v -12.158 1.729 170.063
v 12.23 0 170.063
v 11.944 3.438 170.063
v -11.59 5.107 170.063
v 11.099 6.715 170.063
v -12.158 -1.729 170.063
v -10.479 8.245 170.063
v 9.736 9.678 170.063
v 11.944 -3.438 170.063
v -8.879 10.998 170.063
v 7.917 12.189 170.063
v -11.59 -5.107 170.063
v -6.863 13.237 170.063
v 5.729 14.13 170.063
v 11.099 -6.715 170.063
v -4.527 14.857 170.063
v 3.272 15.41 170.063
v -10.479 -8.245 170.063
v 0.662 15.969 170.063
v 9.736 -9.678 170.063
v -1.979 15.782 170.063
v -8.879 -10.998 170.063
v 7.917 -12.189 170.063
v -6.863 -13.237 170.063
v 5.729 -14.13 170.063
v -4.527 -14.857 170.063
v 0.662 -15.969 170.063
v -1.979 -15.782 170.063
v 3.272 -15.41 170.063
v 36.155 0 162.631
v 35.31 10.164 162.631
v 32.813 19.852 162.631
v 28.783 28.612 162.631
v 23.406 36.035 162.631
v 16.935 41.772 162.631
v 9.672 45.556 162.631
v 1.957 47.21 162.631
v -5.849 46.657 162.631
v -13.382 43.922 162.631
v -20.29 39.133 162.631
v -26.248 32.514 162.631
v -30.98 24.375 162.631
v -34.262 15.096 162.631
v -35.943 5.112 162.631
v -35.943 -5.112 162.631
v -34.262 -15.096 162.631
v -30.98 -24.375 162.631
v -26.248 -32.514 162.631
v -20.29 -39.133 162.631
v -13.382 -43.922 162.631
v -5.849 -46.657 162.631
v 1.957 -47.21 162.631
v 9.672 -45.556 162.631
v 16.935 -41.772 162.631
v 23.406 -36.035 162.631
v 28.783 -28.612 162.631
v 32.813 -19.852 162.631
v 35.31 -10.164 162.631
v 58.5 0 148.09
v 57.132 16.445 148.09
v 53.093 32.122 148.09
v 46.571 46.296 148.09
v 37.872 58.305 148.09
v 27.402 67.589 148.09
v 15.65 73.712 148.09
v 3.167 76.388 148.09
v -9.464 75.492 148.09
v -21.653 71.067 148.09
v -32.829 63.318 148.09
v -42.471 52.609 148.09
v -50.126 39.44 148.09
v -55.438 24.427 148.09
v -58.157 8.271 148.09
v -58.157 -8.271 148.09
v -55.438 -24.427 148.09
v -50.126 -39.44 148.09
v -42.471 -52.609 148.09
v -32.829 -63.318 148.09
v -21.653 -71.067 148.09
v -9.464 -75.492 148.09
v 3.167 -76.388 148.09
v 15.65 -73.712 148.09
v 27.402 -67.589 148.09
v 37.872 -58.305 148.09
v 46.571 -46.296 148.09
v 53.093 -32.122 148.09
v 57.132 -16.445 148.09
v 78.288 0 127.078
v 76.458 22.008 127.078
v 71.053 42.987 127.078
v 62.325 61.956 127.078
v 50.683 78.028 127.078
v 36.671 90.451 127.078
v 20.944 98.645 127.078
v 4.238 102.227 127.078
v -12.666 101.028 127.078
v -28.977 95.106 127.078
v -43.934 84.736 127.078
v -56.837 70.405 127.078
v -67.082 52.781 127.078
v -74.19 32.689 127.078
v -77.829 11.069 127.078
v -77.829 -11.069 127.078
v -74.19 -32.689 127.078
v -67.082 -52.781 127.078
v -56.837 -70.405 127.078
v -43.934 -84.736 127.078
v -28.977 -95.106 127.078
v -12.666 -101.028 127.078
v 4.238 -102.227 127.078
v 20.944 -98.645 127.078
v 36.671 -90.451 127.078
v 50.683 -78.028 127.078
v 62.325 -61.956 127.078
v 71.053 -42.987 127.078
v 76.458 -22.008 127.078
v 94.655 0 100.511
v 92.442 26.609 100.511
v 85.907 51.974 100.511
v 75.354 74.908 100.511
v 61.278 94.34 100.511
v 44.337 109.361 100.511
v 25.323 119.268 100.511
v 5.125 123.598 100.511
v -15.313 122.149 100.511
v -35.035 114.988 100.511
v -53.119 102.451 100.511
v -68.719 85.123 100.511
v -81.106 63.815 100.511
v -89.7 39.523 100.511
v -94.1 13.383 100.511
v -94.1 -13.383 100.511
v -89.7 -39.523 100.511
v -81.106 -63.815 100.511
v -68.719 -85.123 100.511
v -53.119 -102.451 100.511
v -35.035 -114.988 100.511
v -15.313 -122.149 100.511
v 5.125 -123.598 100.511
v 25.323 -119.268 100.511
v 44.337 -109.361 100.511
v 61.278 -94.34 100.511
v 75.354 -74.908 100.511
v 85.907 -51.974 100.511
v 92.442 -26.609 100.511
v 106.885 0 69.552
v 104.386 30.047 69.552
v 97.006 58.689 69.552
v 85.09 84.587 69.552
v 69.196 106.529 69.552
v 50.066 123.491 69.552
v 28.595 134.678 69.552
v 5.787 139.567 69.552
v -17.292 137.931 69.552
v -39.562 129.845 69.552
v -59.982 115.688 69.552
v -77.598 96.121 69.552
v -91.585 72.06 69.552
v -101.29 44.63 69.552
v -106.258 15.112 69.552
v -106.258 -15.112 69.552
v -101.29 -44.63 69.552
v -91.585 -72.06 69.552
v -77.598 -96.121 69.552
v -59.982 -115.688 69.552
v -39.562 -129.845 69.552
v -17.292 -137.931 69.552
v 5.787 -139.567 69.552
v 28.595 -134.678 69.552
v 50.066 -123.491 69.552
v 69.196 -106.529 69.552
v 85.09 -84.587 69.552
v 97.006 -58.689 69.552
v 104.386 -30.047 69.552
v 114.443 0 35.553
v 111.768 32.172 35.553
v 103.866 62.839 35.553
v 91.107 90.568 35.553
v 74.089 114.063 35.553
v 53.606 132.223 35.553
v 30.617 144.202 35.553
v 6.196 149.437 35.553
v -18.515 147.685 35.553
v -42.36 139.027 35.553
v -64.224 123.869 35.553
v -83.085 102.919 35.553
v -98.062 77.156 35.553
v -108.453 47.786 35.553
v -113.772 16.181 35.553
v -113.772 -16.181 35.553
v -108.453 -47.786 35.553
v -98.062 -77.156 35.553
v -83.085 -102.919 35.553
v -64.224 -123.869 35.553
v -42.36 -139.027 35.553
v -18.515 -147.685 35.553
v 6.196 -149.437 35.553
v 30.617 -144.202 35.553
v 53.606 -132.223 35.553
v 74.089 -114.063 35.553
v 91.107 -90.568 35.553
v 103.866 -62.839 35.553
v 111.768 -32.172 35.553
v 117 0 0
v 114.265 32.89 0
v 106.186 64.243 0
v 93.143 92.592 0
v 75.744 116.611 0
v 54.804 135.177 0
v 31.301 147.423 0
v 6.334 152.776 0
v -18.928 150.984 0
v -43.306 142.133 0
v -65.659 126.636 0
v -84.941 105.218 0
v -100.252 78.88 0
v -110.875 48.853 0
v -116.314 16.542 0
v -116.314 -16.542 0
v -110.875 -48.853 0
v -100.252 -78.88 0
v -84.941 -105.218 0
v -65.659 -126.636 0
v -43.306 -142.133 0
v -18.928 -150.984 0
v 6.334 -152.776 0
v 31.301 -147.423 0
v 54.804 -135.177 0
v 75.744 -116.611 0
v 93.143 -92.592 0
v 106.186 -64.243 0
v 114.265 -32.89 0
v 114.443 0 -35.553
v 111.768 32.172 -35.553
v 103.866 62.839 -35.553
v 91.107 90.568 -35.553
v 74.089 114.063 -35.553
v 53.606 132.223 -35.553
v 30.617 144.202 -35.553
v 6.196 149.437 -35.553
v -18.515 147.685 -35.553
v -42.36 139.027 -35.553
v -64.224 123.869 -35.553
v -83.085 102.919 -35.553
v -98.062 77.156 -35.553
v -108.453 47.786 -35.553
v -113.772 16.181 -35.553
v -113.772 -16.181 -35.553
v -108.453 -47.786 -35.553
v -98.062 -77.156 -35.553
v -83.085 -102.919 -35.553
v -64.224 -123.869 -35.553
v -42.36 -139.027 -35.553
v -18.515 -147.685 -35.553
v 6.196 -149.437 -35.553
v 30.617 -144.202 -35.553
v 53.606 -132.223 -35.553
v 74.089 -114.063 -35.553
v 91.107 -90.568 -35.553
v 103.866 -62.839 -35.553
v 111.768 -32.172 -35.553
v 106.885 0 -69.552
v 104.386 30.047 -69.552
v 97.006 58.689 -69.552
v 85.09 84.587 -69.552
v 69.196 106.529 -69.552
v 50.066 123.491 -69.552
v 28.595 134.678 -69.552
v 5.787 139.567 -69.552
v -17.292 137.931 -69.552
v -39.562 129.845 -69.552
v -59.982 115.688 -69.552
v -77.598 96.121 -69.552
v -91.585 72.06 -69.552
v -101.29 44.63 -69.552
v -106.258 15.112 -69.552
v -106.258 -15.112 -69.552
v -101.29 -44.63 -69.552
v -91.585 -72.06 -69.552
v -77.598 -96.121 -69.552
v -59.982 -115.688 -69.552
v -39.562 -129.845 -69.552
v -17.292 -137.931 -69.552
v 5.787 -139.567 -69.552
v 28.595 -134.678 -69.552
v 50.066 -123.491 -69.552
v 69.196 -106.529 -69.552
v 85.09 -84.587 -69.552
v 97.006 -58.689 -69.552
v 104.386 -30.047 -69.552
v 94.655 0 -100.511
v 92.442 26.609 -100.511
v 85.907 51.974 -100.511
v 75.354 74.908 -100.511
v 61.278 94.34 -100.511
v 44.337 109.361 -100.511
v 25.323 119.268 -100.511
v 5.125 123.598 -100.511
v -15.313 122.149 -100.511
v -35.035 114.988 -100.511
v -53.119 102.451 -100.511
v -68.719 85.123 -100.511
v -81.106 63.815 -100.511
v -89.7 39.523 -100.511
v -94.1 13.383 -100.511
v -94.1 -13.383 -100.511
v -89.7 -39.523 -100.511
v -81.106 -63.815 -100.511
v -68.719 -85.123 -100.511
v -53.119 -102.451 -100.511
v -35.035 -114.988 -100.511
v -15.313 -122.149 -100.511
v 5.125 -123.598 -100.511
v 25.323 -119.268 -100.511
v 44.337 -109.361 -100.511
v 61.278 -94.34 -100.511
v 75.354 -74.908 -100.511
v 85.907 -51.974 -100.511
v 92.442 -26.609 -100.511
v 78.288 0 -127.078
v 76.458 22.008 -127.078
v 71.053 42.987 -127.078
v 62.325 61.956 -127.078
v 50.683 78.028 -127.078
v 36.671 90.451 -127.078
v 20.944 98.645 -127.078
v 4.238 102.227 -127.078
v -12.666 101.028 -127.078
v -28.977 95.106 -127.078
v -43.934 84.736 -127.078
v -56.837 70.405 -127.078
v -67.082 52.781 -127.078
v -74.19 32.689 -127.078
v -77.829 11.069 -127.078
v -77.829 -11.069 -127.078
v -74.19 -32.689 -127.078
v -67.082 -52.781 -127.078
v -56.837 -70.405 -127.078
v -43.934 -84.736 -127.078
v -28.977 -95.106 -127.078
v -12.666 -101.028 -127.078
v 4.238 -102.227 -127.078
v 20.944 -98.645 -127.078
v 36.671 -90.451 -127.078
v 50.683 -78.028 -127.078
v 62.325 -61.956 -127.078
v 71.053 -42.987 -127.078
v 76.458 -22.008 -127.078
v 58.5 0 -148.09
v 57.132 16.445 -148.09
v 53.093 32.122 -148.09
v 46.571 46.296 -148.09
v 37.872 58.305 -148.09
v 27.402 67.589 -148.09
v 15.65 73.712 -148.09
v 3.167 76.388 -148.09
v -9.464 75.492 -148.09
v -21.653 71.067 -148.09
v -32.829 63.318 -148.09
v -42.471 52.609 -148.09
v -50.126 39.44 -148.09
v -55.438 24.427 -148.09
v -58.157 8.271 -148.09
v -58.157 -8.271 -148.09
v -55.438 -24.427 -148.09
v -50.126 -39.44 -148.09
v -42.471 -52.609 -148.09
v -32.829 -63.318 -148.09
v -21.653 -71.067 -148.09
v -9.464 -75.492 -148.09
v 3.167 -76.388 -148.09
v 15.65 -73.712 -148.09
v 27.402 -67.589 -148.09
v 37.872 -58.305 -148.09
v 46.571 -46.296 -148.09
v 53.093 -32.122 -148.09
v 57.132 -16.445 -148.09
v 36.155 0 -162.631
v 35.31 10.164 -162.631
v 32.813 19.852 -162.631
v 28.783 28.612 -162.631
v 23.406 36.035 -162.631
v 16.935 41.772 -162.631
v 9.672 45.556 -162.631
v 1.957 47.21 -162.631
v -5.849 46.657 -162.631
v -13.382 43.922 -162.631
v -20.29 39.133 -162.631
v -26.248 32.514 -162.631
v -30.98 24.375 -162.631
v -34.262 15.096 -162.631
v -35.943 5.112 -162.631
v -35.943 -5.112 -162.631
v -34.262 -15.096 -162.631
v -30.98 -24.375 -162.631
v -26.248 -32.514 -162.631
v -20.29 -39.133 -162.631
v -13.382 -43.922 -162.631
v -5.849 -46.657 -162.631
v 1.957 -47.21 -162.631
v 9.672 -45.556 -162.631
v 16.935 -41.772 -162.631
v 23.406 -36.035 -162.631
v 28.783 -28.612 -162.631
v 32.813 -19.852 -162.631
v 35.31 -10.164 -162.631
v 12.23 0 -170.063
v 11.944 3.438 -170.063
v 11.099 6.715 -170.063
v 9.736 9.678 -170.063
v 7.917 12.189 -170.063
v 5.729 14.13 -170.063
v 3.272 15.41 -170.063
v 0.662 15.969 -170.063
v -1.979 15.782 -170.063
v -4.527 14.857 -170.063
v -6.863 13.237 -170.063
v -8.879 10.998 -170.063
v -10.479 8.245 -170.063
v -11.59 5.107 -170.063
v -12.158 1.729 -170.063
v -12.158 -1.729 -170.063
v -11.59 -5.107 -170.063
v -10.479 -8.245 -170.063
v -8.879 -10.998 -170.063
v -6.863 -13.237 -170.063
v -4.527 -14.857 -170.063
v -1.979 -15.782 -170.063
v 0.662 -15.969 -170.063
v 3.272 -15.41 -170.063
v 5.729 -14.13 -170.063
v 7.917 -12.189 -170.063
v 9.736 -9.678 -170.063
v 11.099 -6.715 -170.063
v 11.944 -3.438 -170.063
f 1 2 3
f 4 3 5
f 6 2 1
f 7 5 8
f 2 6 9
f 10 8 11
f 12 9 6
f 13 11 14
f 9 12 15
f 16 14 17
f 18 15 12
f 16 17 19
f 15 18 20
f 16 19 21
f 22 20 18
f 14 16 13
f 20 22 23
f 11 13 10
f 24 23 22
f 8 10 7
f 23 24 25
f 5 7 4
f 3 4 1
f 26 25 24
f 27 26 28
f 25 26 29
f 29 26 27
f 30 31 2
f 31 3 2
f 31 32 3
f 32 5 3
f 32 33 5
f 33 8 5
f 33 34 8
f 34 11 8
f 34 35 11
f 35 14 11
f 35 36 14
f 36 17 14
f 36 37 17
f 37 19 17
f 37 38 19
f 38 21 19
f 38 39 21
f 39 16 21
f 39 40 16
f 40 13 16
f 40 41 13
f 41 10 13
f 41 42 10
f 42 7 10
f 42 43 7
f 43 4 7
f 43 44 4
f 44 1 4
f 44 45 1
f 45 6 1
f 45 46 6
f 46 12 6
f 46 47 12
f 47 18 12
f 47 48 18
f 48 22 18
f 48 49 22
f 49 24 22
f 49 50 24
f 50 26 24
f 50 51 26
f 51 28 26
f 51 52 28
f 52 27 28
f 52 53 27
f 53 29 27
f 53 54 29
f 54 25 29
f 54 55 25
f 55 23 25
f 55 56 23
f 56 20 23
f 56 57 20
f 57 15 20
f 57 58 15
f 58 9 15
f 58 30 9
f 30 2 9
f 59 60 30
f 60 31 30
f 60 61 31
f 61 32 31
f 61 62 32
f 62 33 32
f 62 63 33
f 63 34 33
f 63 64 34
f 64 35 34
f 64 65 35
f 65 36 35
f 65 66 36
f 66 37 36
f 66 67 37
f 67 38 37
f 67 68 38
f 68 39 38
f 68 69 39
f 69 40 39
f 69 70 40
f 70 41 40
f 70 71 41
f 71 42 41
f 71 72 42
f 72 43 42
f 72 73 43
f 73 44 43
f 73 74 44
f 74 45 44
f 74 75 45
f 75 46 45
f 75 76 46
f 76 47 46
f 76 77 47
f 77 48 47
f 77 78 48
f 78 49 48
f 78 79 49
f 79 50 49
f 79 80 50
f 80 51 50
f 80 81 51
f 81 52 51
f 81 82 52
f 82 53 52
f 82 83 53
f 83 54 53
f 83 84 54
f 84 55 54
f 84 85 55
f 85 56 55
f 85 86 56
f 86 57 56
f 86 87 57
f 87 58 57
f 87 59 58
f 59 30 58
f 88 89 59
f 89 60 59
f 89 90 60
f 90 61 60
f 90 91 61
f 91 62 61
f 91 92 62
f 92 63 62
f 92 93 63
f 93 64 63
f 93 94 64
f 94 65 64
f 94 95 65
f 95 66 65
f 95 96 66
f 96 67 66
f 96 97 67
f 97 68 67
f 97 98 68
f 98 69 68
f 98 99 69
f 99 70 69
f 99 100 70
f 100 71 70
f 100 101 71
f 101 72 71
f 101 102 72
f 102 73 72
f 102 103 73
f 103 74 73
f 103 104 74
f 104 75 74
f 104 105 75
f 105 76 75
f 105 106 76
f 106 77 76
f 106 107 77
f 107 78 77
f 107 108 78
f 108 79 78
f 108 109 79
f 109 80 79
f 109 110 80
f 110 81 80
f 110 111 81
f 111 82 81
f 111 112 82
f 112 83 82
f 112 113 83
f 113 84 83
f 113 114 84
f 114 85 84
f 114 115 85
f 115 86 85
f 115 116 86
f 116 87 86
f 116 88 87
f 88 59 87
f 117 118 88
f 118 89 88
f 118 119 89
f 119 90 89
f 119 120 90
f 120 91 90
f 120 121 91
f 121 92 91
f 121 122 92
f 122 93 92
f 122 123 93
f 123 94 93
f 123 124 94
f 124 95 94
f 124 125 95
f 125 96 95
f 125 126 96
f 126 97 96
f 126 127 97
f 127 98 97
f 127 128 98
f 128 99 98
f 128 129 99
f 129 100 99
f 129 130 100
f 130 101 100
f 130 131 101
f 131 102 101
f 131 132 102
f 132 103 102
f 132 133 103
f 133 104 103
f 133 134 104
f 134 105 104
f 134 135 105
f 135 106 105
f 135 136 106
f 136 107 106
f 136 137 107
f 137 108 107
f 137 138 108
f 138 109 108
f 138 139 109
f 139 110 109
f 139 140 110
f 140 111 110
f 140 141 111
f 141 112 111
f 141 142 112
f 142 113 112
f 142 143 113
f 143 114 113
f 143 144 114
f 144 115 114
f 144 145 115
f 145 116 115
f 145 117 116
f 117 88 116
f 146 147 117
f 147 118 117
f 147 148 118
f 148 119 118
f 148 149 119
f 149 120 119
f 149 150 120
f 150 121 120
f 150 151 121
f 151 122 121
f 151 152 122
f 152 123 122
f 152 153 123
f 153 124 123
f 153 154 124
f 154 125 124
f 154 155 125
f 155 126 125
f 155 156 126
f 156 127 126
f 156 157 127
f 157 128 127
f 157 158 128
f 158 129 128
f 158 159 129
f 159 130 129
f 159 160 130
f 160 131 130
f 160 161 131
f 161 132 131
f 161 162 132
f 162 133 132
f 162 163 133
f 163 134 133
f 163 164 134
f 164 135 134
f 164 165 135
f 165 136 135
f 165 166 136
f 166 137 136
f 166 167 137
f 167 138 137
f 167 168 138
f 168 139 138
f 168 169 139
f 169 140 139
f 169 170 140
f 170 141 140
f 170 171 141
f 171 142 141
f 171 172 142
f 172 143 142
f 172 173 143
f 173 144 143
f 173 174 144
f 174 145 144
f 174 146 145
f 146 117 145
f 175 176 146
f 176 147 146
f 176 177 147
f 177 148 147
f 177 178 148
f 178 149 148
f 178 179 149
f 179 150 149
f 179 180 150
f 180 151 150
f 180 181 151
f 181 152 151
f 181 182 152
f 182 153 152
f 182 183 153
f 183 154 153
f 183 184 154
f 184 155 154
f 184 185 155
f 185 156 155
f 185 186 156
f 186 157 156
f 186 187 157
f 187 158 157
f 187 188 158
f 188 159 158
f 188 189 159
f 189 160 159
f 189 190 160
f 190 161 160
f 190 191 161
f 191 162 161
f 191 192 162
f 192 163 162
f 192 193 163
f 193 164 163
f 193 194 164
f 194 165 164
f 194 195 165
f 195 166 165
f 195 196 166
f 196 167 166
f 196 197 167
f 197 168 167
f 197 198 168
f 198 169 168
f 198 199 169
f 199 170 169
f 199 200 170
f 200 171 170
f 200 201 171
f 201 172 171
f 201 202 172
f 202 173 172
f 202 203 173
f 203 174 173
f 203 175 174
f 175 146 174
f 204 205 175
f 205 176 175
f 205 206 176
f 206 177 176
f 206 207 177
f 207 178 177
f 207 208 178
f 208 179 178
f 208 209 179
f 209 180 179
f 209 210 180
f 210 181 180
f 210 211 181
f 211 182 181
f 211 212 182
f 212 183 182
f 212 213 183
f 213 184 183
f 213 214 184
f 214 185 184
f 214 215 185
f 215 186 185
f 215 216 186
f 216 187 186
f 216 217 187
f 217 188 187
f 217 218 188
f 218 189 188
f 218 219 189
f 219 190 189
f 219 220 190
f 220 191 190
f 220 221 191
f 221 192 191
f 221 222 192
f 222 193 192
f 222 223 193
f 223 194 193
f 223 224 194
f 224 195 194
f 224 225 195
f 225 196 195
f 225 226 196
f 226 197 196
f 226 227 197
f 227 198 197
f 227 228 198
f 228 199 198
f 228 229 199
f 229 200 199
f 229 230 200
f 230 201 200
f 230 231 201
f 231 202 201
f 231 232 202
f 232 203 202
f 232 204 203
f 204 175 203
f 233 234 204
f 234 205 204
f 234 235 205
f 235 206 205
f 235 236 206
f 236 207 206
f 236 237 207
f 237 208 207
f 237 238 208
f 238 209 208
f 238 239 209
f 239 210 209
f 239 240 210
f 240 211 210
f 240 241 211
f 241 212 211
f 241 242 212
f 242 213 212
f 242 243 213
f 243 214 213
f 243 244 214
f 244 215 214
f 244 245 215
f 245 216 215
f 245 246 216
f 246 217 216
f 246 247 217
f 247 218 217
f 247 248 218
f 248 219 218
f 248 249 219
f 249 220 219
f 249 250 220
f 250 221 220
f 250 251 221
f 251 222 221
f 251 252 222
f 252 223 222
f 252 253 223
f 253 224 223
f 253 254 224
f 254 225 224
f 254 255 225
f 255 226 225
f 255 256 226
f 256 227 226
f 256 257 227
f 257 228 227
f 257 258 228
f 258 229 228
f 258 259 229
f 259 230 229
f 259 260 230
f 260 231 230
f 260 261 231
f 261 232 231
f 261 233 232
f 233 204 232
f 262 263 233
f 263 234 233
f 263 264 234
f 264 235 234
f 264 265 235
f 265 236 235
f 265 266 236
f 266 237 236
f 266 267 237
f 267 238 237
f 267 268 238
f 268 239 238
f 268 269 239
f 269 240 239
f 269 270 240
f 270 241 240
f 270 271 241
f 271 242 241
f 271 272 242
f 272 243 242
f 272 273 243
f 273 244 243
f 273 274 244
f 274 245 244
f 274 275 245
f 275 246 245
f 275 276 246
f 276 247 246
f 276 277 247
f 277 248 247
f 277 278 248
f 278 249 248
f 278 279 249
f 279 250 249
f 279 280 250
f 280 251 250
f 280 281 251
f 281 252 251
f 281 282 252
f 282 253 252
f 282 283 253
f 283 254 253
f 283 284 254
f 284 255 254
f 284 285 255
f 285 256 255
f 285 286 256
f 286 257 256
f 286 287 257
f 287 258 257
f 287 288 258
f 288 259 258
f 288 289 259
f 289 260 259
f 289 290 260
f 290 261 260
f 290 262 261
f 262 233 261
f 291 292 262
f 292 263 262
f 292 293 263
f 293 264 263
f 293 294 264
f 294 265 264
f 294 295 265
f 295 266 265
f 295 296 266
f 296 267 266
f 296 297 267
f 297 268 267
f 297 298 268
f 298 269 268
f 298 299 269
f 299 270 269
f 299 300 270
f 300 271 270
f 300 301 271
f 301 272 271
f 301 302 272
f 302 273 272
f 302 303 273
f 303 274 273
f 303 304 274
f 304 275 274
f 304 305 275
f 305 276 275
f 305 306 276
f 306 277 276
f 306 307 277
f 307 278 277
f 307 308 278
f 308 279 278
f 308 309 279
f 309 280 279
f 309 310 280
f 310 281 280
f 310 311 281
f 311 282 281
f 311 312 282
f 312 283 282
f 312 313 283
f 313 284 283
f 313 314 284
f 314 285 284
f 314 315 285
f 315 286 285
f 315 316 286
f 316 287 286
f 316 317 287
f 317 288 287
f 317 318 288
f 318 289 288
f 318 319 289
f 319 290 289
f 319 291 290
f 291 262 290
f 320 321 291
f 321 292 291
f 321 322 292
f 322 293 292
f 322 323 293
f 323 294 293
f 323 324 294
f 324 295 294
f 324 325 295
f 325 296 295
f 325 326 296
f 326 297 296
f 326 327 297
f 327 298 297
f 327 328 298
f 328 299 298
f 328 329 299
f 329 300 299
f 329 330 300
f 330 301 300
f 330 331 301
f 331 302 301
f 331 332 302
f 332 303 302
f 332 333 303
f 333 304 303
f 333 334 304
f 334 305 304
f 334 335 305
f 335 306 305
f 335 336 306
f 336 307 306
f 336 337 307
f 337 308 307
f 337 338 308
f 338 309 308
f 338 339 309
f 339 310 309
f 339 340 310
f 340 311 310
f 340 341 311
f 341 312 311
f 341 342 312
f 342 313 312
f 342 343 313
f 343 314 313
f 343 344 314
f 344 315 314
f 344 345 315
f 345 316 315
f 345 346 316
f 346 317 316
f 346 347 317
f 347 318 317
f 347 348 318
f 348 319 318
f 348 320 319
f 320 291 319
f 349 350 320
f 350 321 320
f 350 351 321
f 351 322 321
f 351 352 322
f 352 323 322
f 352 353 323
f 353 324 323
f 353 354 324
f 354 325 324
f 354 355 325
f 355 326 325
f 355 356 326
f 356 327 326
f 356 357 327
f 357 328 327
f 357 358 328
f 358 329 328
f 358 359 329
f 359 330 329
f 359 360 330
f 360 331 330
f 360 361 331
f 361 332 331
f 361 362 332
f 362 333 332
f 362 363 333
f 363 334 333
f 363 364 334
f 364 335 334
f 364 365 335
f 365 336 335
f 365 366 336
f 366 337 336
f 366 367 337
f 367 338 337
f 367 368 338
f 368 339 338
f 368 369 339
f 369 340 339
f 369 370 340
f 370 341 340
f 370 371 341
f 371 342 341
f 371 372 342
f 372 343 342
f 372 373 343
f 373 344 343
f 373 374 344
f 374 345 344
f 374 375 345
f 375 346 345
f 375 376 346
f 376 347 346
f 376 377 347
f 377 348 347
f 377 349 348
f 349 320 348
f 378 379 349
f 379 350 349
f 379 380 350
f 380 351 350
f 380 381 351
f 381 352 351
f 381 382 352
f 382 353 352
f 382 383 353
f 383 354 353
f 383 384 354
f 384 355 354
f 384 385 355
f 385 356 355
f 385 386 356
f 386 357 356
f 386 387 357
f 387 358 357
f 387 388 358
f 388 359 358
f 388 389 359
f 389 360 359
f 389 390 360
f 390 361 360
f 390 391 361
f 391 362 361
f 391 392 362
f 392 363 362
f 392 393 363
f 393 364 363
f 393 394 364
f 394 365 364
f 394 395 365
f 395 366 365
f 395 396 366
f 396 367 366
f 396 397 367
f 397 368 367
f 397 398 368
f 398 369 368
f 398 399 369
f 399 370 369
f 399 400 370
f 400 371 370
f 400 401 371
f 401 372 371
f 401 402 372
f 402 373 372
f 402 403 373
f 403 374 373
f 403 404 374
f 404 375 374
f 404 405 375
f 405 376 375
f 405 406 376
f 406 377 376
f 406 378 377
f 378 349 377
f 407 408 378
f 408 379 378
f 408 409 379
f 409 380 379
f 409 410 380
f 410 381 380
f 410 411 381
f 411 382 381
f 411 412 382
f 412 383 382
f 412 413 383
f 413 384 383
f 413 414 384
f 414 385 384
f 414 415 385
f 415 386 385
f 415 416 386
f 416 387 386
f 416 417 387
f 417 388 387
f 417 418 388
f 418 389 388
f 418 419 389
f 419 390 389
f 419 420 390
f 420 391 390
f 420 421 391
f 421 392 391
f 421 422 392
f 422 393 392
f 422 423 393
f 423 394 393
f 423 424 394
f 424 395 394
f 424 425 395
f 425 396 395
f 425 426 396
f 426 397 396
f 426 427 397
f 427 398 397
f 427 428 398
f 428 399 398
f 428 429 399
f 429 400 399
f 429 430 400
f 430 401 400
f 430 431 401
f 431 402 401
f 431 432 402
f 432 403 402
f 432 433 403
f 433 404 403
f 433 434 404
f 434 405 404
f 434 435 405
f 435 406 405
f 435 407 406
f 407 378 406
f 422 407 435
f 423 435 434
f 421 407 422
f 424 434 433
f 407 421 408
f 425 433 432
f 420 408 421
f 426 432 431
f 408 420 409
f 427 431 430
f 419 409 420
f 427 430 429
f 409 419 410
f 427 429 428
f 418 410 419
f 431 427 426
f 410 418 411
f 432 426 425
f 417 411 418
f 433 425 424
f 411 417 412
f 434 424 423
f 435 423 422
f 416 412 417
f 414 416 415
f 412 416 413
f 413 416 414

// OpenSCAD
// Generated by SolidPython 1.0.1 on 2020-07-29 00:46:51


scale(v = [13, 17, 19]) {
	sphere(r = 9);
}
/***********************************************
*********      SolidPython code:      **********
************************************************
 
# import packages: SolidPython
from solid import *
from solid.utils import *
from itertools import chain, combinations, permutations


class Resize:

    def __init__(self, scad_file):
        self.scad_file = scad_file
        #self.scad_file = import_scad(scad_file)
        # cone/cylinder param:
        self.r1 = 0
        self.r2 = 0
        self.h = 0
        # rectangular prism param:
        self.w = 0
        self.l = 0
        # ellipse param:
        self.r = 0

    # import OpenScad code (file name corresponds to shape)


    # classify shape + parameters
    def assign(self, param1, param2, param3):
        if self.scad_file == 'cone.scad':
            self.r1 = param1
            self.r2 = param2
            self.h = param3
        elif self.scad_file == 'cylinder.scad':
            self.r1 = param1
            self.r2 = param2
            self.h = param3
        elif self.scad_file == 'rectangularPrism.scad':
            self.h = param1
            self.l = param2
            self.w = param3
        else:
            self.r = param1
            self.h = param2

    # resize parameters
    def iterate(self):
        x = range(3, 20, 2)
        i = 1
        if self.scad_file == 'cone.scad':
            tempList = list(permutations(x, 2))
            for temp in tempList:
                param1 = temp[0]
                param2 = temp[1]
                filepath = 'produced_scad_files/' + 'cone' + str(param1) + '_' + str(param2) + '_' + '.scad'
                scad_render_to_file(cylinder(h=param1, r1=param2, r2=0), filepath)

        elif self.scad_file == 'cylinder.scad':
            tempList = list(permutations(x, 3))
            for temp in tempList:
                param1 = temp[0]
                param2 = temp[1]
                filepath = 'produced_scad_files/' + 'cylinder' + str(param1) + '_' + str(param2) + '_' + '.scad'
                scad_render_to_file(cylinder(h=param1, r1=param2, r2=param2), filepath)

        elif self.scad_file == 'rectangularPrism.scad':
            tempList = list(permutations(x, 3))
            for temp in tempList:
                param1 = temp[0]
                param2 = temp[1]
                param3 = temp[2]
                filepath = 'produced_scad_files/' + 'rectangularPrism' + str(param1) + '_' + str(param2) + '_' + str(
                    param3) + '.scad'
                scad_render_to_file(cube(size=(param1, param2, param3)), filepath)

        elif self.scad_file == 'ellipse.scad':
            tempList = list(permutations(x, 4))
            for temp in tempList:
                param1 = temp[0]
                param2 = temp[1]
                param3 = temp[2]
                param4 = temp[3]
                filepath = 'produced_scad_files/' + 'ellipse' + str(param1) + '_' + str(param2) + '_' + str(param3) + '_' + str(param4) + '.scad'
                scad_render_to_file(scale([param1, param2, param3])(sphere(r=param4)), filepath)

    def render_to_scadfile(self):
        scad_render_to_file(scad, 'example.scad') 
 
************************************************/
